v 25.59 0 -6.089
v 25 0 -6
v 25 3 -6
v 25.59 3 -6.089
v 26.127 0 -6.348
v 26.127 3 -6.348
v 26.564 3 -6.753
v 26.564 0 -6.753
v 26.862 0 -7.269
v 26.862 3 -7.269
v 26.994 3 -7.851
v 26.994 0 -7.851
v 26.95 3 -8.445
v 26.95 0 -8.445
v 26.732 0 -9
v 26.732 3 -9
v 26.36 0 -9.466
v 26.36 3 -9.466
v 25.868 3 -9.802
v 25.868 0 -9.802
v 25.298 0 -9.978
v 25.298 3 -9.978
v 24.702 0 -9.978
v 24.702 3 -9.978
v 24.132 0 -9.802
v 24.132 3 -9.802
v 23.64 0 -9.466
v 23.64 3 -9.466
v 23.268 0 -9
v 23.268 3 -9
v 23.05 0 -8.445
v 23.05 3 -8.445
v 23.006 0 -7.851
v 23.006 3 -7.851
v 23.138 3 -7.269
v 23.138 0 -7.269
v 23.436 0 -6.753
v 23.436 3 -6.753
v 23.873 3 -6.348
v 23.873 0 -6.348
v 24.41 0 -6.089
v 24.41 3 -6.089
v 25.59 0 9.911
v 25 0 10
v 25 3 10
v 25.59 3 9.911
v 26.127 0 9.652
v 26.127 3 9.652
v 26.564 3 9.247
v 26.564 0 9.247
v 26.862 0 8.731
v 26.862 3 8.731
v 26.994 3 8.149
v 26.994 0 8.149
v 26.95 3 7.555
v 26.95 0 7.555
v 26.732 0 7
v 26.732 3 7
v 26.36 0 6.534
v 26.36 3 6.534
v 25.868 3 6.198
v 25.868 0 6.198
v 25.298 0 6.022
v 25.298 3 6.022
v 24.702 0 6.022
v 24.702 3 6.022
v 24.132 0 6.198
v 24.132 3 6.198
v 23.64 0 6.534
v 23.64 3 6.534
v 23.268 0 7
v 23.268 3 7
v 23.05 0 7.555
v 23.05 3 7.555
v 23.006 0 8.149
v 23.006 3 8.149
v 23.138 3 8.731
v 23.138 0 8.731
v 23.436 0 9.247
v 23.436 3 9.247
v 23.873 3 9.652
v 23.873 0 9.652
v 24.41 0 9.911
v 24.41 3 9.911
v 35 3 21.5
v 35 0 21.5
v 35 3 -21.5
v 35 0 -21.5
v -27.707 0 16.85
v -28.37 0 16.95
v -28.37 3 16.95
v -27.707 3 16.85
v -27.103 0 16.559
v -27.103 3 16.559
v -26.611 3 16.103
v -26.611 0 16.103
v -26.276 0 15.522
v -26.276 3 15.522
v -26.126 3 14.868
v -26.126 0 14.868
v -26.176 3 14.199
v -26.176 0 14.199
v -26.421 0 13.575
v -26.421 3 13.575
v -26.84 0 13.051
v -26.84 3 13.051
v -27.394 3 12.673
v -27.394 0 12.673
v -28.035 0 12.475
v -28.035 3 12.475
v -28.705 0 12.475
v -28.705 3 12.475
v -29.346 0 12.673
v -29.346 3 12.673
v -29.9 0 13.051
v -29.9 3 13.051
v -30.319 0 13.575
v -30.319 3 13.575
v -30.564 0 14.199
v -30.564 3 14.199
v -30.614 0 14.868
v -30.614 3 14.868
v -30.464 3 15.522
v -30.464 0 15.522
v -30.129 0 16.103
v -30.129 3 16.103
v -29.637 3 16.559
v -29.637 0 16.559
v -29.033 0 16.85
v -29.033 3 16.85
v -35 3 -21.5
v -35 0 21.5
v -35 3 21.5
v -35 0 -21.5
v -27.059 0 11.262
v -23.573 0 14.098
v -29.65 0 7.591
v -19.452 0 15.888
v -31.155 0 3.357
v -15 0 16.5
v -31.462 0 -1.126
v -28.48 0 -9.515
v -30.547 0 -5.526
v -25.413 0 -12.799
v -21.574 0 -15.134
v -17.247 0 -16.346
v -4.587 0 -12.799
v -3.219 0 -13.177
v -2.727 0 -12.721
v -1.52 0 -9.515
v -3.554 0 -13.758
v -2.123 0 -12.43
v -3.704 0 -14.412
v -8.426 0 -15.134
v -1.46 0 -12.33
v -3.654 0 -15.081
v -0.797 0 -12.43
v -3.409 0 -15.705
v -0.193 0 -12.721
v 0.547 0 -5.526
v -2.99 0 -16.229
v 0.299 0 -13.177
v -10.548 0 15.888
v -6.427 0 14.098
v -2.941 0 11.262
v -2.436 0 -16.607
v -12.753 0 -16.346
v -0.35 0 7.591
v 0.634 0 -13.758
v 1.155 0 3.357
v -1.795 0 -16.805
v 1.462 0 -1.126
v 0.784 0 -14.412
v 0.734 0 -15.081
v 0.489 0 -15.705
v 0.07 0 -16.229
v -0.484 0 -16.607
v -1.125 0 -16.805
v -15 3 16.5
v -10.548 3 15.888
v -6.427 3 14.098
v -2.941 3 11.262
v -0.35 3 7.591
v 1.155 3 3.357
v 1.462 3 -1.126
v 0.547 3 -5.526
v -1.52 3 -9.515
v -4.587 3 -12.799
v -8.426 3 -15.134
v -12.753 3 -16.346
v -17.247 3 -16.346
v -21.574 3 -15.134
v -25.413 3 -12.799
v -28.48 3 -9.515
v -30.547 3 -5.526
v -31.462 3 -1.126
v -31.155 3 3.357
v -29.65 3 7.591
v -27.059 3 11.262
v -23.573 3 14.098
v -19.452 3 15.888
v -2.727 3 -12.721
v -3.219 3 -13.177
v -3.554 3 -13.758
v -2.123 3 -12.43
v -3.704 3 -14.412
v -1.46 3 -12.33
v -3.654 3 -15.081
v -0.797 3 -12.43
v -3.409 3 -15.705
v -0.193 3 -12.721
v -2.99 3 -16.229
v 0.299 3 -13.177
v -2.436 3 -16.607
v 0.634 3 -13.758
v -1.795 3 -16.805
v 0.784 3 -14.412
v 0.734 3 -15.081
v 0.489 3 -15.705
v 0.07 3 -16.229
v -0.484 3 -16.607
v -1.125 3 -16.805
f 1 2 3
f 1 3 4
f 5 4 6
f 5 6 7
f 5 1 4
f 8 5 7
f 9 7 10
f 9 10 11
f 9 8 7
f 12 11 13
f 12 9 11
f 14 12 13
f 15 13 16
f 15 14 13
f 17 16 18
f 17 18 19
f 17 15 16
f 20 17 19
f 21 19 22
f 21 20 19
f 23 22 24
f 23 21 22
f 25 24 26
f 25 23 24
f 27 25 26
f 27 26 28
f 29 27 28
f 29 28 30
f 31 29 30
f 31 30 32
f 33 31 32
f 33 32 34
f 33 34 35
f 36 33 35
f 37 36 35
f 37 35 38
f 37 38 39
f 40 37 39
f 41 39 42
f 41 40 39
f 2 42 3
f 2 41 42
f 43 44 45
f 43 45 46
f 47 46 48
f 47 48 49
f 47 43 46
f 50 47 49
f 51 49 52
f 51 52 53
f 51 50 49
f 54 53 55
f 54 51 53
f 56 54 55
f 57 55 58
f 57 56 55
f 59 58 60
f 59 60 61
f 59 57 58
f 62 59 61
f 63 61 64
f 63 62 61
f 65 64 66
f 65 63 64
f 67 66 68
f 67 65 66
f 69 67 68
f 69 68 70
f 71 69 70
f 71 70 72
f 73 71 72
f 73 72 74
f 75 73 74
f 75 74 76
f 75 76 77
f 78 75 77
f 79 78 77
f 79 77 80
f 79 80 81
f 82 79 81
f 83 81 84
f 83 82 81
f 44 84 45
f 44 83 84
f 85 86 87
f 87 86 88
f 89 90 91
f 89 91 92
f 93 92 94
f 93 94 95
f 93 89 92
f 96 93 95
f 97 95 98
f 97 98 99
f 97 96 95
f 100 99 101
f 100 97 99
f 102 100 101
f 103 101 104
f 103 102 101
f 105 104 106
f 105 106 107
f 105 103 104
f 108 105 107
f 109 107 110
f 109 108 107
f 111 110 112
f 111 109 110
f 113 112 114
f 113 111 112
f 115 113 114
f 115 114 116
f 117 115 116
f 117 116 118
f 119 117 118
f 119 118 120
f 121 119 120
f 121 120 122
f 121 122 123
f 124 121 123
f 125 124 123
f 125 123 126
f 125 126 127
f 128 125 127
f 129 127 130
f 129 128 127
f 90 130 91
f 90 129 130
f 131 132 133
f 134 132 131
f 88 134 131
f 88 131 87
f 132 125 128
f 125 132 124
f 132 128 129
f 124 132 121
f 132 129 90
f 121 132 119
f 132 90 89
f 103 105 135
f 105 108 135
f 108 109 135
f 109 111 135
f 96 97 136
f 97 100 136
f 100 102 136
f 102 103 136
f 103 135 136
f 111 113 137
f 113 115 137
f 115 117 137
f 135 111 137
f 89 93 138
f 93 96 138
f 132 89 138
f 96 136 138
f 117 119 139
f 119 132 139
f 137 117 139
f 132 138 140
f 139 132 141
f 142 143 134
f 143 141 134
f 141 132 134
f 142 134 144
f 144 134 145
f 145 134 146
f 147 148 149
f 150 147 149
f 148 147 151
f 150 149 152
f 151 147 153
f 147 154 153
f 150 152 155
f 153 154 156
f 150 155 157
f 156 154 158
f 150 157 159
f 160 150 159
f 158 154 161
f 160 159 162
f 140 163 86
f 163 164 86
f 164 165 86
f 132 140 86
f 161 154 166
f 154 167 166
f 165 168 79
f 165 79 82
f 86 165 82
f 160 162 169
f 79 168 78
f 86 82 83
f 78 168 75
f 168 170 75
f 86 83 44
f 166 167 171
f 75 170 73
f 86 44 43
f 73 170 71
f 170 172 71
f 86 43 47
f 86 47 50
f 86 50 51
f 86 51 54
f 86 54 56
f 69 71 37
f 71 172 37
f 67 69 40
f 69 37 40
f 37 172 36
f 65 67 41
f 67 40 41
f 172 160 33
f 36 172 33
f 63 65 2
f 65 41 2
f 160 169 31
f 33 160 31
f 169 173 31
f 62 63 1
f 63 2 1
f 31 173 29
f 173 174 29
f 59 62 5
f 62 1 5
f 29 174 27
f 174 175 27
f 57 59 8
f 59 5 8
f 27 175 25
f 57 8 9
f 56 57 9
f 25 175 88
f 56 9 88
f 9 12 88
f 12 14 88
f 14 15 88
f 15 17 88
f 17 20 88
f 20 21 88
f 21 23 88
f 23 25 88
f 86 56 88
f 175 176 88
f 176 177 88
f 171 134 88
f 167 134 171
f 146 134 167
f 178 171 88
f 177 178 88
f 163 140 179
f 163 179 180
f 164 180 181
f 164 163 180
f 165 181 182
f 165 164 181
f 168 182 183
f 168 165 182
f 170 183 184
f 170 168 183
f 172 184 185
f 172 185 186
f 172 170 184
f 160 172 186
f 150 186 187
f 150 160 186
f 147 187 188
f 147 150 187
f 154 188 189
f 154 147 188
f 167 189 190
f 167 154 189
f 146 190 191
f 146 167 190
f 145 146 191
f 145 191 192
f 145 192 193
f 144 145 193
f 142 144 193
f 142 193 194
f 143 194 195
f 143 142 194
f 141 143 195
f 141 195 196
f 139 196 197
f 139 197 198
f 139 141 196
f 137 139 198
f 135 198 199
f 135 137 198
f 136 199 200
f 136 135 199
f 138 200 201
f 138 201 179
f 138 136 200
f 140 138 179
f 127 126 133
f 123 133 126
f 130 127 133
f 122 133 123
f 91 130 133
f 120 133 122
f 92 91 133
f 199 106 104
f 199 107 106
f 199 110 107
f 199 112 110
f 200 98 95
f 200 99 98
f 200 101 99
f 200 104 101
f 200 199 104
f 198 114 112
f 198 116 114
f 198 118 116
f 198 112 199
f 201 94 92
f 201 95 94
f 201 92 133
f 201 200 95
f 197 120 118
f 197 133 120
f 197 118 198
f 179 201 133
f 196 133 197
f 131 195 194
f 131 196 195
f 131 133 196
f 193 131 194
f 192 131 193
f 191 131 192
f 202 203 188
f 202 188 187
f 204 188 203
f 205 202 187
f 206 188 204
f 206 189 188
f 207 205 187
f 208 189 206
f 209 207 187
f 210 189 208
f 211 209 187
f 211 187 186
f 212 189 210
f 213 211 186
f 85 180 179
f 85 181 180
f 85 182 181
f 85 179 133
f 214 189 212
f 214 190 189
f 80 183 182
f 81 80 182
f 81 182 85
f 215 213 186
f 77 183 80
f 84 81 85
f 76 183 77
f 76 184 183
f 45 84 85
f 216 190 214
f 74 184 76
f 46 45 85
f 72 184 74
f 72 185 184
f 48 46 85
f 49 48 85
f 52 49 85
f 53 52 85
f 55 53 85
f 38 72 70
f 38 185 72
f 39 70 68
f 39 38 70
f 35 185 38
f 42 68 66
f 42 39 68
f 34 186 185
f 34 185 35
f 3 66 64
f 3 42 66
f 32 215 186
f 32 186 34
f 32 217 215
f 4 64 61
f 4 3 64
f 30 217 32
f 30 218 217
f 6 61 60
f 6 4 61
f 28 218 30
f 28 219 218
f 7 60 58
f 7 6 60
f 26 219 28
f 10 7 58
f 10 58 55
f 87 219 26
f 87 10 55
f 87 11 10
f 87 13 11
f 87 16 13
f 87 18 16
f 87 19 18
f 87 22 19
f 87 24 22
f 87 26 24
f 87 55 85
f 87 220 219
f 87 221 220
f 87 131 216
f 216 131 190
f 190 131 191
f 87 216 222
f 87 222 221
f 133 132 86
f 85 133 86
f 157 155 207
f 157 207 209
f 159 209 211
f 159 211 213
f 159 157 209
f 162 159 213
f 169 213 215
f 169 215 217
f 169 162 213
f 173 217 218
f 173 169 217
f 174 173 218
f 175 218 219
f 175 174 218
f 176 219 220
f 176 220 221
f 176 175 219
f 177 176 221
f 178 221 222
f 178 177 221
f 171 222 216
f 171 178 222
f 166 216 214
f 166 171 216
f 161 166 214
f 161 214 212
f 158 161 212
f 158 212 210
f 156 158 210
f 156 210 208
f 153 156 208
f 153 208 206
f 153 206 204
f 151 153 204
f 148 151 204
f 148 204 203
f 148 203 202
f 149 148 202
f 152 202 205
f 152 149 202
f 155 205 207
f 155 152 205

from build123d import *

# Parameters (mm, degrees)
SKETCH1_W           = 70
SKETCH1_H           = 43
SKETCH1_R           = 16.5
SKETCH1_R_2         = 2.25
SKETCH1_R_3         = 2
BOSS_EXTRUDE1_DEPTH = 3


with BuildPart() as part:
    # Sketch1 → Boss-Extrude1 (new body)
    with BuildSketch(Plane(origin=(0, 0, 0), x_dir=(1, 0, 0), z_dir=(0, 1, 0))):
        Rectangle(SKETCH1_W, SKETCH1_H)
        with Locations(Location((-15, 0, 0), (0, 0, 270))):
            Circle(SKETCH1_R, mode=Mode.SUBTRACT)
        with Locations(Location((-1.46, 14.58, 0), (0, 0, 270))):
            Circle(SKETCH1_R_2, mode=Mode.SUBTRACT)
        with Locations(Location((-28.37, -14.7, 0), (0, 0, 270))):
            Circle(SKETCH1_R_2, mode=Mode.SUBTRACT)
        with Locations(Location((25, 8, 0), (0, 0, 270))):
            Circle(SKETCH1_R_3, mode=Mode.SUBTRACT)
        with Locations(Location((25, -8, 0), (0, 0, 270))):
            Circle(SKETCH1_R_3, mode=Mode.SUBTRACT)
    extrude(amount=BOSS_EXTRUDE1_DEPTH)


solid = part.part
